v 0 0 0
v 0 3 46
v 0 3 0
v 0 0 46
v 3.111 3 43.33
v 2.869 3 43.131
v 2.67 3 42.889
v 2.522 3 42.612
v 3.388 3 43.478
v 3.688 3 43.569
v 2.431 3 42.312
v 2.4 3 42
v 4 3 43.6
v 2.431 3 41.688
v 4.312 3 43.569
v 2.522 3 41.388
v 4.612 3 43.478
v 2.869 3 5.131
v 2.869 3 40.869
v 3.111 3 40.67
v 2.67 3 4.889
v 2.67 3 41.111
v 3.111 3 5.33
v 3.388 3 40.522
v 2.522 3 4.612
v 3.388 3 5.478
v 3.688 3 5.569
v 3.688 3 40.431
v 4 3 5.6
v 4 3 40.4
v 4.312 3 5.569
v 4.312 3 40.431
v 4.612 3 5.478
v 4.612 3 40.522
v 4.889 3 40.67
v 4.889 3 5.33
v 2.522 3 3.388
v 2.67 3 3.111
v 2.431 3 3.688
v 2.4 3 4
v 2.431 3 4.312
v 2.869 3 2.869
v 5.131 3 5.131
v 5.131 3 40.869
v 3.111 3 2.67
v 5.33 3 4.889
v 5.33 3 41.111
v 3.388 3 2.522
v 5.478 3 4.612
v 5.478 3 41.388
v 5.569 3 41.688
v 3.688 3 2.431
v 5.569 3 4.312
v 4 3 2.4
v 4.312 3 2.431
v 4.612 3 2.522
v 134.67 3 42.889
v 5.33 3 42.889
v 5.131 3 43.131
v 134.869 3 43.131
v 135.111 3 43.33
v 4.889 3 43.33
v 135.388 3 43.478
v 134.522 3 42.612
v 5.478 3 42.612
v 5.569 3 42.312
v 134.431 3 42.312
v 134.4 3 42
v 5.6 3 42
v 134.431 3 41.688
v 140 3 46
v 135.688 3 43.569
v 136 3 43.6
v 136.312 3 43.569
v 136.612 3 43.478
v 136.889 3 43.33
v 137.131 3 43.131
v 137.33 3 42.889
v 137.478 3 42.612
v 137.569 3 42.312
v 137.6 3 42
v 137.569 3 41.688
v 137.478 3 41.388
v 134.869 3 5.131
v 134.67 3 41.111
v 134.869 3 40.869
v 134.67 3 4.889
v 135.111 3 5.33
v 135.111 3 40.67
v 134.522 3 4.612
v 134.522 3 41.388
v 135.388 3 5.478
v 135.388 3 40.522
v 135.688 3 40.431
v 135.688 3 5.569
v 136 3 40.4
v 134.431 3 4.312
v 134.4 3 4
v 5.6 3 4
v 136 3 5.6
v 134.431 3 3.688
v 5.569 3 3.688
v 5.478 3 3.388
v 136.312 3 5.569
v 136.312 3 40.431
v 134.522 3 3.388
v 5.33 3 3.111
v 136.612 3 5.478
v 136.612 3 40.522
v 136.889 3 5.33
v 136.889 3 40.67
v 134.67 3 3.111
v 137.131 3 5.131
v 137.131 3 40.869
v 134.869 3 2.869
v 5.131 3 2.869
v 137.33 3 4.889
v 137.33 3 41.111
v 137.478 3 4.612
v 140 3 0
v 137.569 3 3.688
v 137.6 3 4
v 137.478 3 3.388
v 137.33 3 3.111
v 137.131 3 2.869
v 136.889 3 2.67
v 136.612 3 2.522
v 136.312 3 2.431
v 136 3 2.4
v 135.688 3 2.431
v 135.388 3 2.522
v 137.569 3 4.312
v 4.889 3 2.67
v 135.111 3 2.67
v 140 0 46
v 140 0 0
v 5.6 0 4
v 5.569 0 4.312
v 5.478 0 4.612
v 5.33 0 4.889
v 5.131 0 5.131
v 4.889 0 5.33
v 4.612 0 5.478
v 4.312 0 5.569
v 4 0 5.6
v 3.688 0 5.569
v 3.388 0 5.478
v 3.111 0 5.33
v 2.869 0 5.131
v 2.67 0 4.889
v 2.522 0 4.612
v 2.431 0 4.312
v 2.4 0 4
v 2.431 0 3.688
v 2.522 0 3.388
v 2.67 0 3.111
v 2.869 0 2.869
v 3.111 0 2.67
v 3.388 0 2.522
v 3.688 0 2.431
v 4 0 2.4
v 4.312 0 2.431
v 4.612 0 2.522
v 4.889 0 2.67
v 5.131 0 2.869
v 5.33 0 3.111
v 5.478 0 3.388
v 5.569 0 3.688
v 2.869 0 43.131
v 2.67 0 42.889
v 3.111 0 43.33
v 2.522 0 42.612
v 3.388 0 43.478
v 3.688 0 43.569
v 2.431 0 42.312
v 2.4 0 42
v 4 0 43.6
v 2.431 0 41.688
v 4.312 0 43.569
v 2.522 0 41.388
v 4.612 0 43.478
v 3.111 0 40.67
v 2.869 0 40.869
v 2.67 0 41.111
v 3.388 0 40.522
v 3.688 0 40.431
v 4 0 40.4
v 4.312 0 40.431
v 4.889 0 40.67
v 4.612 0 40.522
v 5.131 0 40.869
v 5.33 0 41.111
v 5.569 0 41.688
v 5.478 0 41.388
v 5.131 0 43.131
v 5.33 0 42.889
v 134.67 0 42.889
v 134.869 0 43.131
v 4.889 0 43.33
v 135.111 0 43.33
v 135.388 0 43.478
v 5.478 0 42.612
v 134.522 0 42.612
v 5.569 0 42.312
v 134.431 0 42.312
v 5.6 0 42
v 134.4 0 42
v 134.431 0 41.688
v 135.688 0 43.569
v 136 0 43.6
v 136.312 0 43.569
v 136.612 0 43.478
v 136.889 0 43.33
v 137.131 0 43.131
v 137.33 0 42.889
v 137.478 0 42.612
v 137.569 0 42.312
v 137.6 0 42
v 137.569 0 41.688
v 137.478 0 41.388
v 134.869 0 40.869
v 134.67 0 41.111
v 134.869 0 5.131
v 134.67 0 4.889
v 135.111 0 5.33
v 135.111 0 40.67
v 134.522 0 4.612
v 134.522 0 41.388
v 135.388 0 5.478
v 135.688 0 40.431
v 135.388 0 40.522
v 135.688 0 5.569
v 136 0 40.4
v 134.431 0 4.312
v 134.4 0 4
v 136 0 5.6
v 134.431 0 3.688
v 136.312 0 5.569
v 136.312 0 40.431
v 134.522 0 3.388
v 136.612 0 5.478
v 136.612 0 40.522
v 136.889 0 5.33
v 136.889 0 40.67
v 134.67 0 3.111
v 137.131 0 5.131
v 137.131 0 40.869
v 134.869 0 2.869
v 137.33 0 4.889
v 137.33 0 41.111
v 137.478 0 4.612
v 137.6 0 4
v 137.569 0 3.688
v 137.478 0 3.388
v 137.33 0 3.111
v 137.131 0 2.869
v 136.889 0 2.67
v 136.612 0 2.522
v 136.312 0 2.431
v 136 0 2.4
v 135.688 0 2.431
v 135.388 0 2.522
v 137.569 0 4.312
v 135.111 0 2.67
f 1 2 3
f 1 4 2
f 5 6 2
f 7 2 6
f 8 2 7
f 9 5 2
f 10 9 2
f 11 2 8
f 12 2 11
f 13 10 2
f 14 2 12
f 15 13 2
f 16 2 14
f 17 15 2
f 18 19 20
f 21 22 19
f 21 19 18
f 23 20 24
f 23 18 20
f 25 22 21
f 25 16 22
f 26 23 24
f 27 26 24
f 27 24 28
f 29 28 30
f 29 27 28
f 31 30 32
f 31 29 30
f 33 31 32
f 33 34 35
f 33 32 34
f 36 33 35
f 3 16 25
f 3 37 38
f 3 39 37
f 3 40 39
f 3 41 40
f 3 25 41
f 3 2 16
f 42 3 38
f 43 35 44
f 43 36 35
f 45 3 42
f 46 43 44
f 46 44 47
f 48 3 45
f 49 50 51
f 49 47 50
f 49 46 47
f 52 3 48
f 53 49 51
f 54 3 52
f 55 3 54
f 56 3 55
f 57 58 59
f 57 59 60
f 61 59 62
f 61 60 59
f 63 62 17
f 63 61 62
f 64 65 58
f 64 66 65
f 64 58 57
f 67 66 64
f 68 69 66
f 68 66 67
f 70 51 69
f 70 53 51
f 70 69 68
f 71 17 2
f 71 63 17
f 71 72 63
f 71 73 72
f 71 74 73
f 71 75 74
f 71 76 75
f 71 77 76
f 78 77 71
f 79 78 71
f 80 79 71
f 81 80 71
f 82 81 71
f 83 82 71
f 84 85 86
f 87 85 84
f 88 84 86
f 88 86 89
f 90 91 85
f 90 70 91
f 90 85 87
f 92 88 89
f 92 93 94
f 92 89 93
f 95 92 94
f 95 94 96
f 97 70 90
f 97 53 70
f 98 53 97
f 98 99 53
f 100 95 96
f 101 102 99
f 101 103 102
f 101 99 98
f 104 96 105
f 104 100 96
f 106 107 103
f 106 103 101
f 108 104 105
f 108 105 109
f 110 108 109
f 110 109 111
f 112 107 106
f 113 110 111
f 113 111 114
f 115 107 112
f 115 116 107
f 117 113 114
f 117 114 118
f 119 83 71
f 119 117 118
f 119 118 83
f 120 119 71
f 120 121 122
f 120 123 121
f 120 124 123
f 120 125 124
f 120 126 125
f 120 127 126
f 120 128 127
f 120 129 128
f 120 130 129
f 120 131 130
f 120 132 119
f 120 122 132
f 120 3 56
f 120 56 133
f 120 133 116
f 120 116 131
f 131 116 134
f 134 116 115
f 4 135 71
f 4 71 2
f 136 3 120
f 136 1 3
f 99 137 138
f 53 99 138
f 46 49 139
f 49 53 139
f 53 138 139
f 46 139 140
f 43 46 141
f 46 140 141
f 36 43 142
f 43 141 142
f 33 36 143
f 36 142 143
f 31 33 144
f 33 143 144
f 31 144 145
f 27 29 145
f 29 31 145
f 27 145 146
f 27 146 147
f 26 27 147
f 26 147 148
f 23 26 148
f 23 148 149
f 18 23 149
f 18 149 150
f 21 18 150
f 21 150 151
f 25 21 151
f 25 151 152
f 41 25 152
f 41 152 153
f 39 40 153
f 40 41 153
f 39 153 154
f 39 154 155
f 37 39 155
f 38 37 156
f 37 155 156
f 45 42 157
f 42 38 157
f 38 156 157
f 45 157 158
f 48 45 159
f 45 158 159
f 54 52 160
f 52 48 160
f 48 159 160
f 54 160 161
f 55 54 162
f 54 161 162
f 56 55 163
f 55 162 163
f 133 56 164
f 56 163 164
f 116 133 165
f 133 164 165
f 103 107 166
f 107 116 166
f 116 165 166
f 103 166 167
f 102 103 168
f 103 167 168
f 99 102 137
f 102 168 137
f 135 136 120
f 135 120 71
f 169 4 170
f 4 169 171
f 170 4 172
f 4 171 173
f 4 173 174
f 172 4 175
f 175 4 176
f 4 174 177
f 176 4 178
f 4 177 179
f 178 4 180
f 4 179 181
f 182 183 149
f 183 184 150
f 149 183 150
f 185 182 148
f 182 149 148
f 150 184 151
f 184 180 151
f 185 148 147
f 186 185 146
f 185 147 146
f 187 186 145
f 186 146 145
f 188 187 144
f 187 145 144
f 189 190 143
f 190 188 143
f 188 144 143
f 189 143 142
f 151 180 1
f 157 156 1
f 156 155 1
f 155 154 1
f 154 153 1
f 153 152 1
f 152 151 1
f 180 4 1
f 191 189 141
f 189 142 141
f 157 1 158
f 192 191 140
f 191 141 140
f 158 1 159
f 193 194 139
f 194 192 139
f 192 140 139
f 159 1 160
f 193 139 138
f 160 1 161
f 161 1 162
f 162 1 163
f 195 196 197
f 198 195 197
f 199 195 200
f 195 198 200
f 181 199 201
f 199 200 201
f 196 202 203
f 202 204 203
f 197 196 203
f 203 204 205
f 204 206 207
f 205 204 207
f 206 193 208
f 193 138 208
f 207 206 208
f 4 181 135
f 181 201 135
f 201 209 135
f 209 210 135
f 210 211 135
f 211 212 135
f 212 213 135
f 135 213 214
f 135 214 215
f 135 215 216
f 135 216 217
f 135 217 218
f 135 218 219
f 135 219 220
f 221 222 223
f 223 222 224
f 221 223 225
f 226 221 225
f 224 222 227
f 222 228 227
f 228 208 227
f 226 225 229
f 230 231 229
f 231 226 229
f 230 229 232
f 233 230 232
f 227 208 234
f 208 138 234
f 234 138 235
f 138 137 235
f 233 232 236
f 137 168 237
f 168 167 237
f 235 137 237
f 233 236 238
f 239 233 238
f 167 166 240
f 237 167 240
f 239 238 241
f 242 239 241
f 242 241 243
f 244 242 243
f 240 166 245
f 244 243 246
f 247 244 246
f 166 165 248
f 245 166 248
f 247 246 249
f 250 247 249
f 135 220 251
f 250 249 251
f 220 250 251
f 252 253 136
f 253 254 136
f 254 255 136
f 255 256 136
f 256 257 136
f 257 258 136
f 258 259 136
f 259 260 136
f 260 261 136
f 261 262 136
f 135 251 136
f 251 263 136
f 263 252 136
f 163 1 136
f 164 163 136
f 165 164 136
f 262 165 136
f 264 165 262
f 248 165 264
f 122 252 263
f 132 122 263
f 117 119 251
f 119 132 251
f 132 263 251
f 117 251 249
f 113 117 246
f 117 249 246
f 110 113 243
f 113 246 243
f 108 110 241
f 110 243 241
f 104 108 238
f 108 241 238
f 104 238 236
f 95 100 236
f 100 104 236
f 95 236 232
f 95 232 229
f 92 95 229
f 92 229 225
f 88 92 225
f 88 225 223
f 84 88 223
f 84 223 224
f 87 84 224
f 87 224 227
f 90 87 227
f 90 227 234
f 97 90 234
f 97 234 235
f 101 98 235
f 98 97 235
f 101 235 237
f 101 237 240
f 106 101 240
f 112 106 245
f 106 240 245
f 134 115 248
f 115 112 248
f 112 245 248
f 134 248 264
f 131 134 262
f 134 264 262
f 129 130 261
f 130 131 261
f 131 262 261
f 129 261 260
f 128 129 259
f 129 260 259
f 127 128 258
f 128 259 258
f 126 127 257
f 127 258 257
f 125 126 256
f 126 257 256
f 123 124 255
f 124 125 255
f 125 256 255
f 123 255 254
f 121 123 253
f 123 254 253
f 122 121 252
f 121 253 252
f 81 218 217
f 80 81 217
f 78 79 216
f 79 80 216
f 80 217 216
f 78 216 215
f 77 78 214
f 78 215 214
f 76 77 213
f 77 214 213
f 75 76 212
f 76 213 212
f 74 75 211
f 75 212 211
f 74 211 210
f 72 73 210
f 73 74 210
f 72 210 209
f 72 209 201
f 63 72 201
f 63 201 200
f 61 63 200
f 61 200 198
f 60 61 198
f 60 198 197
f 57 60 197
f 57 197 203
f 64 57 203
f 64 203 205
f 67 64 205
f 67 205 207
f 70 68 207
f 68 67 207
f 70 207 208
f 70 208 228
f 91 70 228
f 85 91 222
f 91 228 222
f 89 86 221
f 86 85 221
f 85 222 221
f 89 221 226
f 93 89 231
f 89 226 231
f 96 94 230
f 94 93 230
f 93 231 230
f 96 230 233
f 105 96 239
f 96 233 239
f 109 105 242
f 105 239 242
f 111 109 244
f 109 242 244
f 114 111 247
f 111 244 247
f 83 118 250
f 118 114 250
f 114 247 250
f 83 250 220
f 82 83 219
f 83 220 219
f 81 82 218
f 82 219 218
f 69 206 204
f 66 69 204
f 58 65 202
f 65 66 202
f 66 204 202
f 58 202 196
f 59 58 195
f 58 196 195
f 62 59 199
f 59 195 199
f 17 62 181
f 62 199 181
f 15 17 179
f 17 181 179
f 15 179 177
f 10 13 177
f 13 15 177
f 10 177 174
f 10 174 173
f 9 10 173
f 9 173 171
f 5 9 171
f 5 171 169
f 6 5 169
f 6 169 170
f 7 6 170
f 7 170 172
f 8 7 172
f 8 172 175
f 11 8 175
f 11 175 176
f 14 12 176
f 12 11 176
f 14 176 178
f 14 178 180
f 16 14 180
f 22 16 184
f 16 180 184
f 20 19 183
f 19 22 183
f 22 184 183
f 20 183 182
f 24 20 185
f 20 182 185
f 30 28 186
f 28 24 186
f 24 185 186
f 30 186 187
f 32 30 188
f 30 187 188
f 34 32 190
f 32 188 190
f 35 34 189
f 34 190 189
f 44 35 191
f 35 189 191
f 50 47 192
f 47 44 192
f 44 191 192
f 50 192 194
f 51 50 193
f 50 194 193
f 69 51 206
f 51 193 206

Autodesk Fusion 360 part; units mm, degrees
sketch "Skizze1" plane through (0, 0, 0) normal (0, 1, 0) x (1, 0, 0)
  line L0 (0, 0) -> (140, 0)
  line L1 (140, 0) -> (140, -46)
  line L2 (140, -46) -> (0, -46)
  line L3 (0, -46) -> (0, 0)
  circle A0 centre (4, -42) radius 1.6
  circle A1 centre (4, -4) radius 1.6
  circle A2 centre (136, -42) radius 1.6
  circle A3 centre (136, -4) radius 1.6
  line L4 (10, -36.5) -> (130, -36.5)
  line L5 (130, -36.5) -> (130, -9.5)
  line L6 (130, -9.5) -> (10, -9.5)
  line L7 (10, -9.5) -> (10, -36.5)
  line L8 (11, -36.65) -> (62.2, -36.65)
  line L9 (62.2, -36.65) -> (62.2, -9.35)
  line L10 (62.2, -9.35) -> (11, -9.35)
  line L11 (11, -9.35) -> (11, -36.65)
  line L12 (77.8, -36.65) -> (129, -36.65)
  line L13 (129, -36.65) -> (129, -9.35)
  line L14 (129, -9.35) -> (77.8, -9.35)
  line L15 (77.8, -9.35) -> (77.8, -36.65)
  circle A4 centre (13.8, -33.85) radius 1.05
  circle A5 centre (59.4, -33.85) radius 1.05
  circle A6 centre (13.8, -12.15) radius 1.05
  circle A7 centre (59.4, -12.15) radius 1.05
  circle A8 centre (80.6, -33.85) radius 1.05
  circle A9 centre (80.6, -12.15) radius 1.05
  circle A10 centre (126.2, -33.85) radius 1.05
  circle A11 centre (126.2, -12.15) radius 1.05
  line L16 (8, -31.1) -> (132, -31.1)
  line L17 (132, -31.1) -> (132, -15.1)
  line L18 (132, -15.1) -> (8, -15.1)
  line L19 (8, -15.1) -> (8, -31.1)
  circle A12 centre (7, -36) radius 1.6
  circle A13 centre (133, -10) radius 1.6
  circle A14 centre (133, -36) radius 1.6
  circle A15 centre (7, -10) radius 1.6
  dimension "d1" = 140
  dimension "d2" = 46
  dimension "d3" = 3.2
  dimension "d4" = 3.2
  dimension "d5" = 3.2
  dimension "d6" = 3.2
  dimension "d7" = 132
  dimension "d8" = 38
  dimension "d9" = 38
  dimension "d10" = 132
  dimension "d11" = 4
  dimension "d12" = 4
  dimension "d60" = 120
  dimension "d61" = 27
  dimension "d62" = 9.5
  dimension "d63" = 10
  dimension "d64" = 1
  dimension "d65" = 1
  dimension "d66" = 51.2
  dimension "d67" = 51.2
  dimension "d68" = 27.3
  dimension "d69" = 27.3
  dimension "d70" = 0.15
  dimension "d71" = 0.15
  dimension "d72" = 2.1
  dimension "d73" = 2.1
  dimension "d74" = 2.1
  dimension "d75" = 2.1
  dimension "d76" = 2.1
  dimension "d77" = 2.1
  dimension "d78" = 2.1
  dimension "d79" = 2.1
  dimension "d80" = 2.8
  dimension "d81" = 2.8
  dimension "d82" = 2.8
  dimension "d83" = 2.8
  dimension "d84" = 45.6
  dimension "d85" = 45.6
  dimension "d86" = 21.7
  dimension "d87" = 21.7
  dimension "d88" = 45.6
  dimension "d89" = 21.7
  dimension "d90" = 21.7
  dimension "d91" = 16
  dimension "d92" = 124
  dimension "d95" = 5.55
  dimension "d115" = 3.2
  dimension "d116" = 3.2
  dimension "d117" = 3.2
  dimension "d118" = 3.2
  dimension "d121" = 126
  dimension "d123" = 10
  dimension "d124" = 7
  dimension "d125" = 26
  dimension "d126" = 126
  dimension "d127" = 26
  dimension "d128" = 36
  dimension "d129" = 133
  dimension "d130" = 133
  dimension "d131" = 8
extrude "Extrusion1" add sketch "Skizze1" along normal blind 3 contours L0 L1 L2 L3 | L4 L7 L11 L16 | L4 L9 L11 L16 | L4 L8 L9 L11 | L7 L16 L18 L19 | L7 L11 L16 L18 | L4 L9 L15 L16 | L9 L11 L16 L18 | L6 L7 L11 L18 | L4 L13 L15 L16 | L4 L12 L13 L15 | L9 L15 L16 L18 | L6 L9 L11 L18 | L4 L5 L13 L16 | L13 L15 L16 L18 | L6 L9 L15 L18 | L6 L9 L10 L11 | L5 L13 L16 L18 | L6 L13 L15 L18 | L5 L16 L17 L18 | L5 L6 L13 L18 | L6 L13 L14 L15 | A4 | A5 | A6 | A7 | A8 | A9 | A10 | A11 | A12 | A13 | A14 | A15
sketch "Skizze4" plane through (0, 0, 0) normal (0, 1, 0) x (1, 0, 0)
  line L0 (7, -39) -> (133, -39)
  line L1 (133, -33) -> (133, -13)
  line L2 (133, -7) -> (7, -7)
  line L3 (7, -13) -> (7, -33)
  arc A0 (7, -33) -> (7, -39) centre (7, -36) ccw
  arc A1 (133, -13) -> (133, -7) centre (133, -10) ccw
  arc A2 (133, -39) -> (133, -33) centre (133, -36) ccw
  arc A3 (7, -7) -> (7, -13) centre (7, -10) ccw
  circle A4 centre (7, -36) radius 1.6
  circle A5 centre (7, -10) radius 1.6
  circle A6 centre (133, -36) radius 1.6
  circle A7 centre (133, -10) radius 1.6
  dimension "d99" = 126
  dimension "d100" = 32
  dimension "d101" = 6
  dimension "d102" = 3
  dimension "d103" = 6
  dimension "d104" = 6
  dimension "d105" = 6
  dimension "d106" = 3
  dimension "d107" = 3
  dimension "d108" = 3
  dimension "d109" = 7
  dimension "d110" = 7
  dimension "d111" = 3.2
  dimension "d112" = 3.2
  dimension "d113" = 3.2
  dimension "d114" = 3.2
sketch "Skizze5" plane through (0, 0, 0) normal (0, 1, 0) x (1, 0, 0)
  line L0 (7, -39) -> (133, -39)
  arc A0 (7, -33) -> (7, -39) centre (7, -36) ccw
  line L1 (7, -13) -> (7, -33)
  arc A1 (7, -7) -> (7, -13) centre (7, -10) ccw
  line L2 (133, -7) -> (7, -7)
  arc A2 (133, -13) -> (133, -7) centre (133, -10) ccw
  line L3 (133, -33) -> (133, -13)
  arc A3 (133, -39) -> (133, -33) centre (133, -36) ccw
  line L4 (77.8, -9.35) -> (77.8, -36.65)
  line L5 (77.8, -36.65) -> (129, -36.65)
  line L6 (129, -36.65) -> (129, -9.35)
  line L7 (129, -9.35) -> (77.8, -9.35)
  line L8 (62.2, -9.35) -> (11, -9.35)
  line L9 (62.2, -36.65) -> (62.2, -9.35)
  line L10 (11, -9.35) -> (11, -36.65)
  line L11 (11, -36.65) -> (62.2, -36.65)
  line L12 (17.25, -34.35) -> (59.97, -34.35)
  line L13 (59.97, -34.35) -> (59.97, -11.65)
  line L14 (59.97, -11.65) -> (17.25, -11.65)
  line L15 (17.25, -11.65) -> (17.25, -34.35)
  line L16 (122.75, -34.35) -> (80.03, -34.35)
  line L17 (80.03, -34.35) -> (80.03, -11.65)
  line L18 (80.03, -11.65) -> (122.75, -11.65)
  line L19 (122.75, -11.65) -> (122.75, -34.35)
  dimension "d132" = 126
  dimension "d133" = 32
  dimension "d134" = 6
  dimension "d135" = 3
  dimension "d136" = 6
  dimension "d137" = 6
  dimension "d138" = 6
  dimension "d139" = 3
  dimension "d140" = 3
  dimension "d141" = 3
  dimension "d142" = 51.2
  dimension "d143" = 51.2
  dimension "d144" = 27.3
  dimension "d145" = 27.3
  dimension "d146" = 7
  dimension "d147" = 7
  dimension "d148" = 9.35
  dimension "d149" = 9.35
  dimension "d150" = 11
  dimension "d151" = 77.8
  dimension "d152" = 6.25
  dimension "d153" = 6.25
  dimension "d154" = 2.23
  dimension "d155" = 2.23
  dimension "d156" = 2.3
  dimension "d157" = 2.3
  dimension "d158" = 2.3
  dimension "d159" = 2.3
sketch "Skizze6" plane through (0, 0, 0) normal (0, 1, 0) x (1, 0, 0)
  line L0 (4, 0) -> (211, 0)
  line L1 (215, -4) -> (215, -58)
  line L2 (211, -62) -> (4, -62)
  line L3 (0, -58) -> (0, -4)
  circle A0 centre (10.75, -53) radius 2.25
  circle A1 centre (10.75, -9) radius 2.25
  circle A2 centre (204.25, -53) radius 2.25
  circle A3 centre (204.25, -9) radius 2.25
  arc A4 (0, -58) -> (4, -62) centre (4, -58) ccw
  arc A5 (4, 0) -> (0, -4) centre (4, -4) ccw
  arc A6 (211, -62) -> (215, -58) centre (211, -58) ccw
  arc A7 (215, -4) -> (211, 0) centre (211, -4) ccw
  point P0 (215, 0)
  point P1 (0, -62)
  dimension "d160" = 62
  dimension "d161" = 215
  dimension "d162" = 4.5
  dimension "d163" = 4.5
  dimension "d164" = 4.5
  dimension "d165" = 4.5
  dimension "d167" = 193.5
  dimension "d168" = 44
  dimension "d170" = 9
  dimension "d171" = 10.75
  dimension "d172" = 4
  dimension "d173" = 4
  dimension "d174" = 4
  dimension "d175" = 4
